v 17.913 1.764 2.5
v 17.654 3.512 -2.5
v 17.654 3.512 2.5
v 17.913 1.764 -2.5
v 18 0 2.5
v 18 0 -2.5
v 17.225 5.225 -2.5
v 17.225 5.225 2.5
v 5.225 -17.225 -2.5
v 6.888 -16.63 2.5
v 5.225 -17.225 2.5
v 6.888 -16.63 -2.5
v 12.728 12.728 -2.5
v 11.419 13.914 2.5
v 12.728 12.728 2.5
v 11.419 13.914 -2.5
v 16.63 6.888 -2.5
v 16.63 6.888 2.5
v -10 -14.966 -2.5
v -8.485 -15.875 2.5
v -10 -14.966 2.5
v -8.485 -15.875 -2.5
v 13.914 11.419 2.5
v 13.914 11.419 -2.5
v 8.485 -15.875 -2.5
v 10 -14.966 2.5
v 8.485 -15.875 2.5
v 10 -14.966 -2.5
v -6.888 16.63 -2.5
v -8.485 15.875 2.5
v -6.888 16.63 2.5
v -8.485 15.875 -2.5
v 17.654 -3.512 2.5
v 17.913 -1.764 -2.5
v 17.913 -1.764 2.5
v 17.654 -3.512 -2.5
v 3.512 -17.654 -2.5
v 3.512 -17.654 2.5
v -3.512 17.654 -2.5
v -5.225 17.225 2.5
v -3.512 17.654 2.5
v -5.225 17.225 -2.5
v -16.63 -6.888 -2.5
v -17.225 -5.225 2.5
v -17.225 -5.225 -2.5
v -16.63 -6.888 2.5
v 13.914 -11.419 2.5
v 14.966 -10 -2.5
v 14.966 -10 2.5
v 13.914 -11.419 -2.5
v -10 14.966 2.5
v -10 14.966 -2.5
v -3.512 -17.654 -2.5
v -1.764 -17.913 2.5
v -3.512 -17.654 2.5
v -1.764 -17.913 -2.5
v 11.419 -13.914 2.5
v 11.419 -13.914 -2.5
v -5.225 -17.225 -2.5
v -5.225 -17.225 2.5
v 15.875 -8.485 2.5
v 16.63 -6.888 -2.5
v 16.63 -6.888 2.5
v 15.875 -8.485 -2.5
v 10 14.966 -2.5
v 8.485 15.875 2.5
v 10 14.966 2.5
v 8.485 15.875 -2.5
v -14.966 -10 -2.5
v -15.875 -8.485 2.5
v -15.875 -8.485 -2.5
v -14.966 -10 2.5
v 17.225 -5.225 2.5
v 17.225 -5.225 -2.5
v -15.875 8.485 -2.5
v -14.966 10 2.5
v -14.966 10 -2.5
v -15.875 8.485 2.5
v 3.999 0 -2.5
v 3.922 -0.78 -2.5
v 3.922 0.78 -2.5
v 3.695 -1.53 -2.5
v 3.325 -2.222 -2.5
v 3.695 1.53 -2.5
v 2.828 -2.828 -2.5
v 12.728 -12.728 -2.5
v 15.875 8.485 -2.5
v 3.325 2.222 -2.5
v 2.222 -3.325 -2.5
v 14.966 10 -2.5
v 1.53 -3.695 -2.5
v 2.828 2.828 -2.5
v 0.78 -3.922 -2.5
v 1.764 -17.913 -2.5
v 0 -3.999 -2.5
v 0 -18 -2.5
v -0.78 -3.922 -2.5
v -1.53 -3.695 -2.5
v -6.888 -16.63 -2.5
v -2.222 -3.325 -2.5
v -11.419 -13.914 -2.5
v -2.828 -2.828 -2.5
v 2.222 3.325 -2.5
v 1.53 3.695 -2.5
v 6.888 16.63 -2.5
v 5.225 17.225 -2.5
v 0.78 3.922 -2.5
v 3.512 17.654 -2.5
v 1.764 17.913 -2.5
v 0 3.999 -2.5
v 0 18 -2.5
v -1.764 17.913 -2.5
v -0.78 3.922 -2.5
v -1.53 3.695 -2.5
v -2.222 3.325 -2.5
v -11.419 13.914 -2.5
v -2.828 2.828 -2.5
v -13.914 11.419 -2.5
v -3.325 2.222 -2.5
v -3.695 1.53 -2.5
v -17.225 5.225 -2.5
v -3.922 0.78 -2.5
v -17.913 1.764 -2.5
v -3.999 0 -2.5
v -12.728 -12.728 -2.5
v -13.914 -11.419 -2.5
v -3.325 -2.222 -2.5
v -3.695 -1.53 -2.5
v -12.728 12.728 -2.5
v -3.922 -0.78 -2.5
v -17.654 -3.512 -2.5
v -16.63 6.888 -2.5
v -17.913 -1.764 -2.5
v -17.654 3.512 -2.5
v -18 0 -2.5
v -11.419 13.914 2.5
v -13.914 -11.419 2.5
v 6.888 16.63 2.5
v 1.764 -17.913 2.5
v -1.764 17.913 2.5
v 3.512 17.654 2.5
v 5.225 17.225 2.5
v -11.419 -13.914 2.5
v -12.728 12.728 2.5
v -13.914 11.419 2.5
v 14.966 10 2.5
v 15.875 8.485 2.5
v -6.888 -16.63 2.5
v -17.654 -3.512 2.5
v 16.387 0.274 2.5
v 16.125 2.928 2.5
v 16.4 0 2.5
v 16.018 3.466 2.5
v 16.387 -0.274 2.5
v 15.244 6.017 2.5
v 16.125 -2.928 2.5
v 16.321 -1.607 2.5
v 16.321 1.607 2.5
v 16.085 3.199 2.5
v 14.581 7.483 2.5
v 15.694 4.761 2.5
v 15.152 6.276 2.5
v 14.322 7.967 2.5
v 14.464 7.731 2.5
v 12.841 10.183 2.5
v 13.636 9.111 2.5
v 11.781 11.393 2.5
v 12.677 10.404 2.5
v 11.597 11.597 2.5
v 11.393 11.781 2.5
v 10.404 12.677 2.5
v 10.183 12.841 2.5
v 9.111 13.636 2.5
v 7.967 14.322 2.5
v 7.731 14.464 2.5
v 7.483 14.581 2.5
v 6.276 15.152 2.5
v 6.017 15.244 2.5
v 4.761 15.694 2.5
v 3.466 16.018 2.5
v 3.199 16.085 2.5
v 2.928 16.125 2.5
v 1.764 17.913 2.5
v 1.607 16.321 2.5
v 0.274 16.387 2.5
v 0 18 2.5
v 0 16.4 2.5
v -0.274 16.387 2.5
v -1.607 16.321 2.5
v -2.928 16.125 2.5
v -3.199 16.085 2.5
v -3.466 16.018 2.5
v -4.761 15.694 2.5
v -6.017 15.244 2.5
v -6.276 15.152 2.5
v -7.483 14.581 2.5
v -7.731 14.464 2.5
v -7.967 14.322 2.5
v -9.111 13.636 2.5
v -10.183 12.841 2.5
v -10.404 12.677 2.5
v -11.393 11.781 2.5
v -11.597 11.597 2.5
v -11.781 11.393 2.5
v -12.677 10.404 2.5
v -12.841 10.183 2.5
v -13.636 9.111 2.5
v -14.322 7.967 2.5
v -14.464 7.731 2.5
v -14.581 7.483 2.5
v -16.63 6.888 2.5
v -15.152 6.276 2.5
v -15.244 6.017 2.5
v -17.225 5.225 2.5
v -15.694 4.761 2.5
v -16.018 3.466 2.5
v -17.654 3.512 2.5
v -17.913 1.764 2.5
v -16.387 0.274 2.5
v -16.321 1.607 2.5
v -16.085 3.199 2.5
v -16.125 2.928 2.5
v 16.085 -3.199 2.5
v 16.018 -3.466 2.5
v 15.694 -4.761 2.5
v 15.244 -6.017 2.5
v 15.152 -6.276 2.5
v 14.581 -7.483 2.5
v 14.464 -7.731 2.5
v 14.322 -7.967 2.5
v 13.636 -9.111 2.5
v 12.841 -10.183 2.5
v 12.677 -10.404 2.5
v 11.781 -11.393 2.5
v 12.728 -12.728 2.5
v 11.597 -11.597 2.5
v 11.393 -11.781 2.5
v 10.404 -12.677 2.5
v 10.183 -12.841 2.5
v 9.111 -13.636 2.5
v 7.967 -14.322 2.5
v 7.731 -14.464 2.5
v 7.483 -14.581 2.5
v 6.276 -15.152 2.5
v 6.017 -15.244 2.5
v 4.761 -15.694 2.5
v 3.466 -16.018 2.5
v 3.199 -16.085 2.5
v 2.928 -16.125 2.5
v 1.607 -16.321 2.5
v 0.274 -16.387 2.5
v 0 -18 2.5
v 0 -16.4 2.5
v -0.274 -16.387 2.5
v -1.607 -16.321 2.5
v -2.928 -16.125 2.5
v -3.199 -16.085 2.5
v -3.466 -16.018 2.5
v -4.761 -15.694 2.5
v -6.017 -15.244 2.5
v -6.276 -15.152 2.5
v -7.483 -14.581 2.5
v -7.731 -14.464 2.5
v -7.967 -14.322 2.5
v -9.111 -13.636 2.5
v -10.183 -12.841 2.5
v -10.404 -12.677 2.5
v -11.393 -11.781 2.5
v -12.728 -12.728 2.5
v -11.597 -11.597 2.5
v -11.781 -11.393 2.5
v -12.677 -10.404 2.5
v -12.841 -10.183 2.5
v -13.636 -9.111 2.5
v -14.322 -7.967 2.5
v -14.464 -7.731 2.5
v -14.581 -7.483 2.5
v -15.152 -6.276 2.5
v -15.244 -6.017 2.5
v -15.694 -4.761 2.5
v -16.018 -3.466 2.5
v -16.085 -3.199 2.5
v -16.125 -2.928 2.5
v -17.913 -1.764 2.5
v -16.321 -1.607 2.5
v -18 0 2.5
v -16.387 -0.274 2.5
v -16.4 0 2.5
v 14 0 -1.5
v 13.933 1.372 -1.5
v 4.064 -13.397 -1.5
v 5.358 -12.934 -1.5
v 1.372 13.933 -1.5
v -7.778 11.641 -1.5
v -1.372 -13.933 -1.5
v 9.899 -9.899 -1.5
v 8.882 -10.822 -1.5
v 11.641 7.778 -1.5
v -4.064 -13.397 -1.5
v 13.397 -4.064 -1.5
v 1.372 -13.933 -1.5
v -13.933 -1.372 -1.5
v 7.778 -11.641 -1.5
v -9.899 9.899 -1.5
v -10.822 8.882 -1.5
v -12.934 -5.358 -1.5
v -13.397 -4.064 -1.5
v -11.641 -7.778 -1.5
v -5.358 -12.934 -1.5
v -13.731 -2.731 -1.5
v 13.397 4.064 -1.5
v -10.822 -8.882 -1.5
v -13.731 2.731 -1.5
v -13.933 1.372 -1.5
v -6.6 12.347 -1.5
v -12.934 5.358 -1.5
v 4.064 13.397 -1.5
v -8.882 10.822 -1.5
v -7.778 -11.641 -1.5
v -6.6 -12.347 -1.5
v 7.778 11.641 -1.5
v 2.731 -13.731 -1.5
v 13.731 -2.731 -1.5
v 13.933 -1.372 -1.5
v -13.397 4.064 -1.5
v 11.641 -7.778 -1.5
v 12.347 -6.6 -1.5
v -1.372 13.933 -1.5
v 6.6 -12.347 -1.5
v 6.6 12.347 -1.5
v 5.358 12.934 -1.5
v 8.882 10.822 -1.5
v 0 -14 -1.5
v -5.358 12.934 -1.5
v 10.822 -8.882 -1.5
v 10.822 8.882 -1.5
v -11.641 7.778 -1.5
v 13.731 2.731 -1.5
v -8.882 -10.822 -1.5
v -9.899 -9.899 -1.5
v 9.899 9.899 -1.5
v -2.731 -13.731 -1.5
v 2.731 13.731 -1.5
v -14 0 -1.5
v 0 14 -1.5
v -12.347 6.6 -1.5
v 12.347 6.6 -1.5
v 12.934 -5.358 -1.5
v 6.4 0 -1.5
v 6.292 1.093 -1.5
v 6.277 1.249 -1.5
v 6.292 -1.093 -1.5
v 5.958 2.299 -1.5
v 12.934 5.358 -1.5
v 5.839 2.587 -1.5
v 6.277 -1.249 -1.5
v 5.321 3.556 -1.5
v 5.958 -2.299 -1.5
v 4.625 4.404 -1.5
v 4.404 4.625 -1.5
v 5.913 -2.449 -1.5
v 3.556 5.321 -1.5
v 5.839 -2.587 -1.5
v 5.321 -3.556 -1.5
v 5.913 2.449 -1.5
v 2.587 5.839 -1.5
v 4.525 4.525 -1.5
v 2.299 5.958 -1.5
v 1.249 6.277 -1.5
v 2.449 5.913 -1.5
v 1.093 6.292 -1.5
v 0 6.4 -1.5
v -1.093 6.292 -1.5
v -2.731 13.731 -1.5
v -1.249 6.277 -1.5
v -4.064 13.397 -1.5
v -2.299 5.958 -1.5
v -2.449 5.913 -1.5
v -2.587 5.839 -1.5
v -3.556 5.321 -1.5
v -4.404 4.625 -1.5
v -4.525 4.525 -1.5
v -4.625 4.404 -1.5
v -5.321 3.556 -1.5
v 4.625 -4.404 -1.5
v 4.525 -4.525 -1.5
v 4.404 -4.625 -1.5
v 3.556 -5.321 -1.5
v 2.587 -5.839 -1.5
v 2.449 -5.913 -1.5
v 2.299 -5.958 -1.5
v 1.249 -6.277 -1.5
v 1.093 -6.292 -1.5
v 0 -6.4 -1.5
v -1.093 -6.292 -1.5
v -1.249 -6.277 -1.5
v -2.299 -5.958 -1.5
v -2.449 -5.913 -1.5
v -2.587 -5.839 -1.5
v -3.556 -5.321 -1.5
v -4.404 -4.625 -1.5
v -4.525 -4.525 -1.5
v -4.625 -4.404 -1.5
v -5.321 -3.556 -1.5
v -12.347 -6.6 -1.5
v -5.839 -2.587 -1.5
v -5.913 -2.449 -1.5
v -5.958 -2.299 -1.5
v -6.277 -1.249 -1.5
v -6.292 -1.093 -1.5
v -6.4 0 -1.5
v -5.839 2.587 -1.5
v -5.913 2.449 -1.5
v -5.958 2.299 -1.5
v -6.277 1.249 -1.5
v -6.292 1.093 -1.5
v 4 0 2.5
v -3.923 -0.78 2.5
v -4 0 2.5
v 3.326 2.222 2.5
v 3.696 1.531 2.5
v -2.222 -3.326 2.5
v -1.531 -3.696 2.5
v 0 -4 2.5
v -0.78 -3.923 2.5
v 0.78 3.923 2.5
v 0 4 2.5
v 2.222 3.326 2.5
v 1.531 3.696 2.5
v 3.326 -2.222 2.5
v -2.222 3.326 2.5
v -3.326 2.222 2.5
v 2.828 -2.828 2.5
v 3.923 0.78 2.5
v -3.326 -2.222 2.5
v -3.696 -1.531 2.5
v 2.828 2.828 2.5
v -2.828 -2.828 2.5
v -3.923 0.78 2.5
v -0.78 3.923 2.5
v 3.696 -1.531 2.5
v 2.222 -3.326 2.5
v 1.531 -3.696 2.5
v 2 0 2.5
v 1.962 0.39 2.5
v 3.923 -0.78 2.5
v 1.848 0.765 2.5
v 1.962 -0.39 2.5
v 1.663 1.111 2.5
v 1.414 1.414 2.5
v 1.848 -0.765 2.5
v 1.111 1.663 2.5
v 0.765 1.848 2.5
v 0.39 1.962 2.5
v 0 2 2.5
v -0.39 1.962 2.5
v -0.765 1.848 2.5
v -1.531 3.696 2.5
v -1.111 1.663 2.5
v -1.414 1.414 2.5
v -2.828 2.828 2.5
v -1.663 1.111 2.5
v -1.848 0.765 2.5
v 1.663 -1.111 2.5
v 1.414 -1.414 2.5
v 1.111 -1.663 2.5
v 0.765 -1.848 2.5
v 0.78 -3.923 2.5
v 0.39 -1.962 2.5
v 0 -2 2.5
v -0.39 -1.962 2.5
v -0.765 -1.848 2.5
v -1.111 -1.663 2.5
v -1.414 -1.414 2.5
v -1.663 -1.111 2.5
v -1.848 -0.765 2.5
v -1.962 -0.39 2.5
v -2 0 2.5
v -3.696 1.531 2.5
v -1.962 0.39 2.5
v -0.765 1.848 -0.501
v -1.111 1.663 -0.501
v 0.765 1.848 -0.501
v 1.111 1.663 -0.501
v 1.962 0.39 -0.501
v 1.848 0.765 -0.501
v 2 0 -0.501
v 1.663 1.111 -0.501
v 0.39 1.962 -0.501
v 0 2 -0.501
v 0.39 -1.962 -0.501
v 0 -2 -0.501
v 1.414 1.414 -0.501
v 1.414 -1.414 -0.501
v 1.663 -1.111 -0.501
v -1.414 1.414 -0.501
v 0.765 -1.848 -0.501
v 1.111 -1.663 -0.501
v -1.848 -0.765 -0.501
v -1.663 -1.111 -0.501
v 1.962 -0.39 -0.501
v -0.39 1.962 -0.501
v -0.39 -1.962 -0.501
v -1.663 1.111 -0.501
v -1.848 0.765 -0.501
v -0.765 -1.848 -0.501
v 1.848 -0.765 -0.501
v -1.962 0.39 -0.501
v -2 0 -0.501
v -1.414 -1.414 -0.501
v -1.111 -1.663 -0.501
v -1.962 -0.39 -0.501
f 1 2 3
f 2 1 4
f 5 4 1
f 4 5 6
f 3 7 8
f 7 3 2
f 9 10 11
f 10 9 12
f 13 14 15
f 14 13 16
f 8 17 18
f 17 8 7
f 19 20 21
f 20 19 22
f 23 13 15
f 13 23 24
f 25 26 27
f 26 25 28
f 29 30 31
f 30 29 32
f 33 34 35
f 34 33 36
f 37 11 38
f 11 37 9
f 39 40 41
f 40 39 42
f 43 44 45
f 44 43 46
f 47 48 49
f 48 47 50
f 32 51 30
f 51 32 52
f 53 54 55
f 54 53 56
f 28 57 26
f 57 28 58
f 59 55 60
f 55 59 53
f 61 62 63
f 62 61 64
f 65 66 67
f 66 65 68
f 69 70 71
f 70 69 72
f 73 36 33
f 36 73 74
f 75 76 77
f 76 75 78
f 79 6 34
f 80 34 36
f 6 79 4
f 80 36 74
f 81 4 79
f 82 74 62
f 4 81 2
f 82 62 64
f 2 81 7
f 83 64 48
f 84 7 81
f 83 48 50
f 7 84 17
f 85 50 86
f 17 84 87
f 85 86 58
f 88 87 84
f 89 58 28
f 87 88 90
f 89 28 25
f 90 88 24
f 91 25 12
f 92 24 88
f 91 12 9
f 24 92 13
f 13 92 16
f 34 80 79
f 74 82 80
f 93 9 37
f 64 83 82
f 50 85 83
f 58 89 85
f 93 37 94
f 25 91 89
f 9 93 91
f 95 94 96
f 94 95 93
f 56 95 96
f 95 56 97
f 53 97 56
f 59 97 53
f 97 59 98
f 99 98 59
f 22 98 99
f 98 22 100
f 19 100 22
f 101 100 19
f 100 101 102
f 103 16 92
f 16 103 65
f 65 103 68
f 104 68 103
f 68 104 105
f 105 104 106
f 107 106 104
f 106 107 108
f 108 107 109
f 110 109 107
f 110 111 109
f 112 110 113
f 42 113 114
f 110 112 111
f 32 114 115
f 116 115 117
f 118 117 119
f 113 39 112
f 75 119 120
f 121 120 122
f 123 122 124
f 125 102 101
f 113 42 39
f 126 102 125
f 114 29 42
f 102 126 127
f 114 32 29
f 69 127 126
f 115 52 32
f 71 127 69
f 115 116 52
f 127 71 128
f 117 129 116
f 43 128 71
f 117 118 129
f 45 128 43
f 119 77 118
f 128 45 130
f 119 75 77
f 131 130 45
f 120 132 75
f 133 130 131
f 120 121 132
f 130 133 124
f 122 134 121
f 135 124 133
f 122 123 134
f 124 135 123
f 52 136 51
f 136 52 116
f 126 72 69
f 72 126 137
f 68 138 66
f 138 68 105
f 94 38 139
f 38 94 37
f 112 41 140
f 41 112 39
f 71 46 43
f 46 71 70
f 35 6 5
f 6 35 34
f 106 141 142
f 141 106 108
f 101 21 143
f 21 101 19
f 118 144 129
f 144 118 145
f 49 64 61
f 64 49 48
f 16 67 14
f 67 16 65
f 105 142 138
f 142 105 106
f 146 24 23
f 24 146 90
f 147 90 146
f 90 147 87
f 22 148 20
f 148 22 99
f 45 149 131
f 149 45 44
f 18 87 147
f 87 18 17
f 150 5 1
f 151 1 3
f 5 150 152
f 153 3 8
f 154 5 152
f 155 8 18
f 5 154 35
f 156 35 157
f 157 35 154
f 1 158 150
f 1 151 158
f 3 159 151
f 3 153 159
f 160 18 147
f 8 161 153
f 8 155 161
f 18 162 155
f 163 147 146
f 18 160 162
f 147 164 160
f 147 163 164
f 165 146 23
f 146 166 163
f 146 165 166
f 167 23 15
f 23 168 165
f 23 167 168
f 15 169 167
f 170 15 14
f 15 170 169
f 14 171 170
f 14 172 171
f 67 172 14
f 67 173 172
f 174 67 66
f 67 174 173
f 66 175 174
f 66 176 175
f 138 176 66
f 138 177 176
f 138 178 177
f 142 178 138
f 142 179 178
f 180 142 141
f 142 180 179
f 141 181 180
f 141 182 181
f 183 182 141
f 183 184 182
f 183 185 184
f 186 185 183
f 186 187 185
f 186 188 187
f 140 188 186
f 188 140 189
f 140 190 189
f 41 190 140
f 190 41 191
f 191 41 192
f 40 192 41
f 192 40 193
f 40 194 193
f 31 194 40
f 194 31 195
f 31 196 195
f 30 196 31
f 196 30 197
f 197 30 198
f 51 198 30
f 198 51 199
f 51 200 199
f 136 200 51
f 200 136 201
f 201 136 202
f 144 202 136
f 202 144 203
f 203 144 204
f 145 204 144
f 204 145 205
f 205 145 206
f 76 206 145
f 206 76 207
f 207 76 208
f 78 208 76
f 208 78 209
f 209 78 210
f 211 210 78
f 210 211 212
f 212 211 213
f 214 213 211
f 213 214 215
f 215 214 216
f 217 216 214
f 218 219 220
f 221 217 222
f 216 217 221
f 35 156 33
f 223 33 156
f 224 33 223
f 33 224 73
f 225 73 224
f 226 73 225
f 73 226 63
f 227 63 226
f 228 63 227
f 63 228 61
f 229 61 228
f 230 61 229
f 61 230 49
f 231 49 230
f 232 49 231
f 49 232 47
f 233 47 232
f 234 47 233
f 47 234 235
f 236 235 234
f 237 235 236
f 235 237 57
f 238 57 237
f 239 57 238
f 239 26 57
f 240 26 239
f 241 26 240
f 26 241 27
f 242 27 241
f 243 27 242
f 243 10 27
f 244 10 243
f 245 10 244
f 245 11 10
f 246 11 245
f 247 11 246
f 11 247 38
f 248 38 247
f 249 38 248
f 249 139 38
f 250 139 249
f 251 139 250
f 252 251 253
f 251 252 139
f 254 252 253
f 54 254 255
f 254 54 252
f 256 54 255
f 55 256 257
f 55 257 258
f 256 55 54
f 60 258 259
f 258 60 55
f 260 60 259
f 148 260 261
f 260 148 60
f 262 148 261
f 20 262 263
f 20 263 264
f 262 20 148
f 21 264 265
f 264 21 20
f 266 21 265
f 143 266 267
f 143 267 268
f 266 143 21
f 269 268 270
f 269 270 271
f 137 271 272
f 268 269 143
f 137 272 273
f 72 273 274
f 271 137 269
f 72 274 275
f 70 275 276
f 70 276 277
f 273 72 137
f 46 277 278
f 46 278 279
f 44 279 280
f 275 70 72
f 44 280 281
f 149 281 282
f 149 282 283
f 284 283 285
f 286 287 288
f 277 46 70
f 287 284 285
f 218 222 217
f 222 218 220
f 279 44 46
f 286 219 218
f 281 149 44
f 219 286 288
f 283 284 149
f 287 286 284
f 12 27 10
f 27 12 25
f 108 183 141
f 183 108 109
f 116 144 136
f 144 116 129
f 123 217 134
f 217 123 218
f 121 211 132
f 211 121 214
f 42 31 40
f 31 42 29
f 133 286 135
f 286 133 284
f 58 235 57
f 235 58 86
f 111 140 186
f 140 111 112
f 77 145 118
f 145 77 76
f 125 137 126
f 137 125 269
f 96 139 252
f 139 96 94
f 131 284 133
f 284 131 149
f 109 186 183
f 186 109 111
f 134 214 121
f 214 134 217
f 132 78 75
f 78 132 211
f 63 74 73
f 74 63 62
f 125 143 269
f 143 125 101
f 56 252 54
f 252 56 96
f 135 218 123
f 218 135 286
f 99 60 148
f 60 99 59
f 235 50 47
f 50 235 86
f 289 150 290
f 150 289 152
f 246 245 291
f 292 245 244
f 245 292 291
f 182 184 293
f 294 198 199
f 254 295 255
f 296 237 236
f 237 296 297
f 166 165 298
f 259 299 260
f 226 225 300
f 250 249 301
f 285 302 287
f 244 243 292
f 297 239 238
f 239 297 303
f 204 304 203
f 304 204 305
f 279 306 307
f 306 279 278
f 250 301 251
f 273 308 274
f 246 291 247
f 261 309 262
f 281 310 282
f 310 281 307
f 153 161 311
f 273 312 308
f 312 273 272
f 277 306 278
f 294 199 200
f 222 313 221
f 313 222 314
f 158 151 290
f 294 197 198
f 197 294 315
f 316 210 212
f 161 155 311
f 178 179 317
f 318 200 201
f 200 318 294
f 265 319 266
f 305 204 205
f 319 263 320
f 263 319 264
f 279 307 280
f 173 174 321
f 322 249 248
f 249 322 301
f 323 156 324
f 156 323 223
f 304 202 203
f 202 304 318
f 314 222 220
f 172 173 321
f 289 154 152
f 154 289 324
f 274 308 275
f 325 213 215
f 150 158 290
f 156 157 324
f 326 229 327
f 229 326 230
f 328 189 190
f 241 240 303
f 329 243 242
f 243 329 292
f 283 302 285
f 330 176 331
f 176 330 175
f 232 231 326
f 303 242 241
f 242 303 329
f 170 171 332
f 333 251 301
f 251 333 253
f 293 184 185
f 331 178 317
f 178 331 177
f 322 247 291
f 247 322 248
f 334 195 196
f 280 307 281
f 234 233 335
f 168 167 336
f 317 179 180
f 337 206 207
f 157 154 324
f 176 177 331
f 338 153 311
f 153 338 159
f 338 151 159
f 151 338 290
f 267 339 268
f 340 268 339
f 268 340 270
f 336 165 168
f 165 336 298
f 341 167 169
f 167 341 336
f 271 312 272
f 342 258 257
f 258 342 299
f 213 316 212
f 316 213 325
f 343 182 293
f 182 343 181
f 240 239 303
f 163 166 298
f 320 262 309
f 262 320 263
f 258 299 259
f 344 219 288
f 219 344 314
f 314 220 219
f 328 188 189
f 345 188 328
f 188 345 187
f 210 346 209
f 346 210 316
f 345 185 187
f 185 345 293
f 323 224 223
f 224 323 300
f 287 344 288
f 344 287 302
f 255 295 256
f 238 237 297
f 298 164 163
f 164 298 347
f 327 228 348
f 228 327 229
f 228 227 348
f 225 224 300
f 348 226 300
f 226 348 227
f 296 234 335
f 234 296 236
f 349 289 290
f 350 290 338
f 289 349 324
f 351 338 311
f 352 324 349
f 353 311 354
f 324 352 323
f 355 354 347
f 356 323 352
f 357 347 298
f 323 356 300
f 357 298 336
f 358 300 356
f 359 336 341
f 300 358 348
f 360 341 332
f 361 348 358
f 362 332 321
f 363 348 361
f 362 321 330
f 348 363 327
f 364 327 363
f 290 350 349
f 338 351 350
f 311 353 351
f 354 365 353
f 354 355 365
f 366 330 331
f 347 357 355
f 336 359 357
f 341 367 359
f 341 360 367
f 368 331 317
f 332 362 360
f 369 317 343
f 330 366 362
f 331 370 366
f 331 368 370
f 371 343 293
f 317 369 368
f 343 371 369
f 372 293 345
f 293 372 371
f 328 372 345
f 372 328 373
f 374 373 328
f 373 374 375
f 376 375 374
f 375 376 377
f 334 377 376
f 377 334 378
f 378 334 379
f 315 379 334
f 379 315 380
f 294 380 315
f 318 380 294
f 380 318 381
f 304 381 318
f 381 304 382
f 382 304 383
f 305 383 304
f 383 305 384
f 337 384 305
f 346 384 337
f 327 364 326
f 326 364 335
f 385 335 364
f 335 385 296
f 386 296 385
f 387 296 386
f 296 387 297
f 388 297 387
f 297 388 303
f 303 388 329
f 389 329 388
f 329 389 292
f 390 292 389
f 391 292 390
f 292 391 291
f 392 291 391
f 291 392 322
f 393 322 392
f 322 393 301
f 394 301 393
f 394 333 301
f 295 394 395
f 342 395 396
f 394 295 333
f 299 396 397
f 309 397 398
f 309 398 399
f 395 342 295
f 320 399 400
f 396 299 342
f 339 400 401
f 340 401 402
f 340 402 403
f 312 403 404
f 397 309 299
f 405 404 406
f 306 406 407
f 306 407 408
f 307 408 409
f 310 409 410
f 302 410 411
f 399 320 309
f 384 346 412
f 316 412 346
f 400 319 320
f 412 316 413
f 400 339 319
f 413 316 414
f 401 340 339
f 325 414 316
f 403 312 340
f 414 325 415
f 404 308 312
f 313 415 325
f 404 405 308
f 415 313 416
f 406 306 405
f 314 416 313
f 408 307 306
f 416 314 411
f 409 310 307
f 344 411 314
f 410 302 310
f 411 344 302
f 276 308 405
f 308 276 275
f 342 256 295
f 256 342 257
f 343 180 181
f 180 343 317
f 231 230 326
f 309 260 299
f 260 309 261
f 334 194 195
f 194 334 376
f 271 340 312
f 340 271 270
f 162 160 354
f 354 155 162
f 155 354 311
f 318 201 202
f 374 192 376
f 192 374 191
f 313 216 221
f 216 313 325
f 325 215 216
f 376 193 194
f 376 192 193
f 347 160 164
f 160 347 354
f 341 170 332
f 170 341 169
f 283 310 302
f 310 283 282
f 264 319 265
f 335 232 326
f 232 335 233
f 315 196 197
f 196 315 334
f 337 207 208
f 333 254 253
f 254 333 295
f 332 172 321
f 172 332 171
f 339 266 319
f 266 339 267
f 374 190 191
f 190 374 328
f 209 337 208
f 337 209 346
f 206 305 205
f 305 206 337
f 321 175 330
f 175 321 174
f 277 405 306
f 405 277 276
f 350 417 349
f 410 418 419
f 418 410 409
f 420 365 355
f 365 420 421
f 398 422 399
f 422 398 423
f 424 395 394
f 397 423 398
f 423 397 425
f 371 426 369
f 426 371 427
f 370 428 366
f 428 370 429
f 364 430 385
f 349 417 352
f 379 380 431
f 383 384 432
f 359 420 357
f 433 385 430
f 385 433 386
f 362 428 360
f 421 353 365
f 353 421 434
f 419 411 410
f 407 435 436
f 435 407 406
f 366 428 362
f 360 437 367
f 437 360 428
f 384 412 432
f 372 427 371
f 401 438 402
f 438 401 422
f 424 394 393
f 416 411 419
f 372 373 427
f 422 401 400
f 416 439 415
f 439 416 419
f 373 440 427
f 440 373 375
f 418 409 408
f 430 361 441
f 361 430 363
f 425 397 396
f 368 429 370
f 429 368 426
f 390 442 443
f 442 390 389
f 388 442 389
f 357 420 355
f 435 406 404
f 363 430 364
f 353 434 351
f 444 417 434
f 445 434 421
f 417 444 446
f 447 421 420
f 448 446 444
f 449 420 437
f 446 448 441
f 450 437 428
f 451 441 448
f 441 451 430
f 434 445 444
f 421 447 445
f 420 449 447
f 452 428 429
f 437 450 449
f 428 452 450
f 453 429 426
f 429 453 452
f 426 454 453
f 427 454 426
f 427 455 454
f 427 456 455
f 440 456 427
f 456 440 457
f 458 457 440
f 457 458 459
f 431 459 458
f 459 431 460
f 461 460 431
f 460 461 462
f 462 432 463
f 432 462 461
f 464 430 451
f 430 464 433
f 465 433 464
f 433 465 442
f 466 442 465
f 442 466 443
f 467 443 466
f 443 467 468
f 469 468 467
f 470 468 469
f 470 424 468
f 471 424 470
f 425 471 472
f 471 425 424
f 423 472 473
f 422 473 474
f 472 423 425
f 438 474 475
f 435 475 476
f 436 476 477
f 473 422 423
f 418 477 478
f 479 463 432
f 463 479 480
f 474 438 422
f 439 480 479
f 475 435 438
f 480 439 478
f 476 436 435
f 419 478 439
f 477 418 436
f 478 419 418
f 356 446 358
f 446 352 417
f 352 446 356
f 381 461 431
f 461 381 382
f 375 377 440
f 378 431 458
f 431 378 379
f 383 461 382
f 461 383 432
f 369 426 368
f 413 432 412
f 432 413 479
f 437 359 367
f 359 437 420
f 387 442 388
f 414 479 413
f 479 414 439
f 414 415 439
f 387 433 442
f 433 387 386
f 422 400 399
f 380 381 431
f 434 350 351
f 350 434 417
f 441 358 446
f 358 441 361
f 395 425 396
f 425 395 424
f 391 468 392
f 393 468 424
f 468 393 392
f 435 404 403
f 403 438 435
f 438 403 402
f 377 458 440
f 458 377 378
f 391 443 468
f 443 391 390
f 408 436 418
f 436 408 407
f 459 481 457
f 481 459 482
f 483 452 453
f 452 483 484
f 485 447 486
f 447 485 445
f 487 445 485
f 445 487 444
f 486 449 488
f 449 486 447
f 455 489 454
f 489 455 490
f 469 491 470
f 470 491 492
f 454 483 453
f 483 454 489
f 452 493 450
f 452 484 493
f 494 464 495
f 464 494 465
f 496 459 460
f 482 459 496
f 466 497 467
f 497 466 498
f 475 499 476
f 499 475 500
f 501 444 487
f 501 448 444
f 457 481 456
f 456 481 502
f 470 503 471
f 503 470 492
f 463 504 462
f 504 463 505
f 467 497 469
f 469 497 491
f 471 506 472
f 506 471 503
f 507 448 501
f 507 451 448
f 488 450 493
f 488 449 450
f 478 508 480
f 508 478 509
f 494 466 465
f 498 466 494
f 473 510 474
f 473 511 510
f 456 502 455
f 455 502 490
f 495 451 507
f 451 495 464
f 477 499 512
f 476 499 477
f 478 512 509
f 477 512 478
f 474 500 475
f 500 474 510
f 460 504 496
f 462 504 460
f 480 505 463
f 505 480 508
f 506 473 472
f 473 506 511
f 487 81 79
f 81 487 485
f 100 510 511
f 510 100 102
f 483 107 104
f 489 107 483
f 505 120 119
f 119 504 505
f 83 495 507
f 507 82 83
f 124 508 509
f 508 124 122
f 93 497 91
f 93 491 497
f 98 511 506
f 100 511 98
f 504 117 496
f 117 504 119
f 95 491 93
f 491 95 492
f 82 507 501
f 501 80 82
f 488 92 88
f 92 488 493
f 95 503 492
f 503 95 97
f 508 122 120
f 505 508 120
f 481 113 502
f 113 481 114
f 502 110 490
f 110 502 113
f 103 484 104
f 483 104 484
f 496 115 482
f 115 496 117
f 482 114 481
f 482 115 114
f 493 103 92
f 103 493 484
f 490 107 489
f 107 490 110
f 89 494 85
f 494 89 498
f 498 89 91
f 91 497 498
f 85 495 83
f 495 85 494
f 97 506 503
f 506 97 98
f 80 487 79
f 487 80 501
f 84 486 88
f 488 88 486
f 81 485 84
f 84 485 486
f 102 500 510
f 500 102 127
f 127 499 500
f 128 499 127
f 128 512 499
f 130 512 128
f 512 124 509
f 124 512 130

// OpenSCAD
//
// foot.scad 
//
// (c) 2018 Prof Dr Andreas Müller, Hochschule Rapperswil
//

r = 18;
h = 5;

difference() {
	union() {
		difference() {
			cylinder(r = r, h = h, $fn = 64, center = true);
			translate([0, 0, 1])
				cylinder(r2 = r - 1, r1 = r - 4, h = h, $fn = 64, center = true);
		}
		cylinder(r1 = 7, r2 = 4, h = h, $fn = 32, center = true);
	}
	translate([0, 0, -0.001])
		union() {
			cylinder(r = 2, h = 10, $fn = 32, center = true);
			translate([0, 0, -1])
				cylinder(r1 = 5, h = 5, r2 = 0, $fn = 32, center = true);
		}
}
